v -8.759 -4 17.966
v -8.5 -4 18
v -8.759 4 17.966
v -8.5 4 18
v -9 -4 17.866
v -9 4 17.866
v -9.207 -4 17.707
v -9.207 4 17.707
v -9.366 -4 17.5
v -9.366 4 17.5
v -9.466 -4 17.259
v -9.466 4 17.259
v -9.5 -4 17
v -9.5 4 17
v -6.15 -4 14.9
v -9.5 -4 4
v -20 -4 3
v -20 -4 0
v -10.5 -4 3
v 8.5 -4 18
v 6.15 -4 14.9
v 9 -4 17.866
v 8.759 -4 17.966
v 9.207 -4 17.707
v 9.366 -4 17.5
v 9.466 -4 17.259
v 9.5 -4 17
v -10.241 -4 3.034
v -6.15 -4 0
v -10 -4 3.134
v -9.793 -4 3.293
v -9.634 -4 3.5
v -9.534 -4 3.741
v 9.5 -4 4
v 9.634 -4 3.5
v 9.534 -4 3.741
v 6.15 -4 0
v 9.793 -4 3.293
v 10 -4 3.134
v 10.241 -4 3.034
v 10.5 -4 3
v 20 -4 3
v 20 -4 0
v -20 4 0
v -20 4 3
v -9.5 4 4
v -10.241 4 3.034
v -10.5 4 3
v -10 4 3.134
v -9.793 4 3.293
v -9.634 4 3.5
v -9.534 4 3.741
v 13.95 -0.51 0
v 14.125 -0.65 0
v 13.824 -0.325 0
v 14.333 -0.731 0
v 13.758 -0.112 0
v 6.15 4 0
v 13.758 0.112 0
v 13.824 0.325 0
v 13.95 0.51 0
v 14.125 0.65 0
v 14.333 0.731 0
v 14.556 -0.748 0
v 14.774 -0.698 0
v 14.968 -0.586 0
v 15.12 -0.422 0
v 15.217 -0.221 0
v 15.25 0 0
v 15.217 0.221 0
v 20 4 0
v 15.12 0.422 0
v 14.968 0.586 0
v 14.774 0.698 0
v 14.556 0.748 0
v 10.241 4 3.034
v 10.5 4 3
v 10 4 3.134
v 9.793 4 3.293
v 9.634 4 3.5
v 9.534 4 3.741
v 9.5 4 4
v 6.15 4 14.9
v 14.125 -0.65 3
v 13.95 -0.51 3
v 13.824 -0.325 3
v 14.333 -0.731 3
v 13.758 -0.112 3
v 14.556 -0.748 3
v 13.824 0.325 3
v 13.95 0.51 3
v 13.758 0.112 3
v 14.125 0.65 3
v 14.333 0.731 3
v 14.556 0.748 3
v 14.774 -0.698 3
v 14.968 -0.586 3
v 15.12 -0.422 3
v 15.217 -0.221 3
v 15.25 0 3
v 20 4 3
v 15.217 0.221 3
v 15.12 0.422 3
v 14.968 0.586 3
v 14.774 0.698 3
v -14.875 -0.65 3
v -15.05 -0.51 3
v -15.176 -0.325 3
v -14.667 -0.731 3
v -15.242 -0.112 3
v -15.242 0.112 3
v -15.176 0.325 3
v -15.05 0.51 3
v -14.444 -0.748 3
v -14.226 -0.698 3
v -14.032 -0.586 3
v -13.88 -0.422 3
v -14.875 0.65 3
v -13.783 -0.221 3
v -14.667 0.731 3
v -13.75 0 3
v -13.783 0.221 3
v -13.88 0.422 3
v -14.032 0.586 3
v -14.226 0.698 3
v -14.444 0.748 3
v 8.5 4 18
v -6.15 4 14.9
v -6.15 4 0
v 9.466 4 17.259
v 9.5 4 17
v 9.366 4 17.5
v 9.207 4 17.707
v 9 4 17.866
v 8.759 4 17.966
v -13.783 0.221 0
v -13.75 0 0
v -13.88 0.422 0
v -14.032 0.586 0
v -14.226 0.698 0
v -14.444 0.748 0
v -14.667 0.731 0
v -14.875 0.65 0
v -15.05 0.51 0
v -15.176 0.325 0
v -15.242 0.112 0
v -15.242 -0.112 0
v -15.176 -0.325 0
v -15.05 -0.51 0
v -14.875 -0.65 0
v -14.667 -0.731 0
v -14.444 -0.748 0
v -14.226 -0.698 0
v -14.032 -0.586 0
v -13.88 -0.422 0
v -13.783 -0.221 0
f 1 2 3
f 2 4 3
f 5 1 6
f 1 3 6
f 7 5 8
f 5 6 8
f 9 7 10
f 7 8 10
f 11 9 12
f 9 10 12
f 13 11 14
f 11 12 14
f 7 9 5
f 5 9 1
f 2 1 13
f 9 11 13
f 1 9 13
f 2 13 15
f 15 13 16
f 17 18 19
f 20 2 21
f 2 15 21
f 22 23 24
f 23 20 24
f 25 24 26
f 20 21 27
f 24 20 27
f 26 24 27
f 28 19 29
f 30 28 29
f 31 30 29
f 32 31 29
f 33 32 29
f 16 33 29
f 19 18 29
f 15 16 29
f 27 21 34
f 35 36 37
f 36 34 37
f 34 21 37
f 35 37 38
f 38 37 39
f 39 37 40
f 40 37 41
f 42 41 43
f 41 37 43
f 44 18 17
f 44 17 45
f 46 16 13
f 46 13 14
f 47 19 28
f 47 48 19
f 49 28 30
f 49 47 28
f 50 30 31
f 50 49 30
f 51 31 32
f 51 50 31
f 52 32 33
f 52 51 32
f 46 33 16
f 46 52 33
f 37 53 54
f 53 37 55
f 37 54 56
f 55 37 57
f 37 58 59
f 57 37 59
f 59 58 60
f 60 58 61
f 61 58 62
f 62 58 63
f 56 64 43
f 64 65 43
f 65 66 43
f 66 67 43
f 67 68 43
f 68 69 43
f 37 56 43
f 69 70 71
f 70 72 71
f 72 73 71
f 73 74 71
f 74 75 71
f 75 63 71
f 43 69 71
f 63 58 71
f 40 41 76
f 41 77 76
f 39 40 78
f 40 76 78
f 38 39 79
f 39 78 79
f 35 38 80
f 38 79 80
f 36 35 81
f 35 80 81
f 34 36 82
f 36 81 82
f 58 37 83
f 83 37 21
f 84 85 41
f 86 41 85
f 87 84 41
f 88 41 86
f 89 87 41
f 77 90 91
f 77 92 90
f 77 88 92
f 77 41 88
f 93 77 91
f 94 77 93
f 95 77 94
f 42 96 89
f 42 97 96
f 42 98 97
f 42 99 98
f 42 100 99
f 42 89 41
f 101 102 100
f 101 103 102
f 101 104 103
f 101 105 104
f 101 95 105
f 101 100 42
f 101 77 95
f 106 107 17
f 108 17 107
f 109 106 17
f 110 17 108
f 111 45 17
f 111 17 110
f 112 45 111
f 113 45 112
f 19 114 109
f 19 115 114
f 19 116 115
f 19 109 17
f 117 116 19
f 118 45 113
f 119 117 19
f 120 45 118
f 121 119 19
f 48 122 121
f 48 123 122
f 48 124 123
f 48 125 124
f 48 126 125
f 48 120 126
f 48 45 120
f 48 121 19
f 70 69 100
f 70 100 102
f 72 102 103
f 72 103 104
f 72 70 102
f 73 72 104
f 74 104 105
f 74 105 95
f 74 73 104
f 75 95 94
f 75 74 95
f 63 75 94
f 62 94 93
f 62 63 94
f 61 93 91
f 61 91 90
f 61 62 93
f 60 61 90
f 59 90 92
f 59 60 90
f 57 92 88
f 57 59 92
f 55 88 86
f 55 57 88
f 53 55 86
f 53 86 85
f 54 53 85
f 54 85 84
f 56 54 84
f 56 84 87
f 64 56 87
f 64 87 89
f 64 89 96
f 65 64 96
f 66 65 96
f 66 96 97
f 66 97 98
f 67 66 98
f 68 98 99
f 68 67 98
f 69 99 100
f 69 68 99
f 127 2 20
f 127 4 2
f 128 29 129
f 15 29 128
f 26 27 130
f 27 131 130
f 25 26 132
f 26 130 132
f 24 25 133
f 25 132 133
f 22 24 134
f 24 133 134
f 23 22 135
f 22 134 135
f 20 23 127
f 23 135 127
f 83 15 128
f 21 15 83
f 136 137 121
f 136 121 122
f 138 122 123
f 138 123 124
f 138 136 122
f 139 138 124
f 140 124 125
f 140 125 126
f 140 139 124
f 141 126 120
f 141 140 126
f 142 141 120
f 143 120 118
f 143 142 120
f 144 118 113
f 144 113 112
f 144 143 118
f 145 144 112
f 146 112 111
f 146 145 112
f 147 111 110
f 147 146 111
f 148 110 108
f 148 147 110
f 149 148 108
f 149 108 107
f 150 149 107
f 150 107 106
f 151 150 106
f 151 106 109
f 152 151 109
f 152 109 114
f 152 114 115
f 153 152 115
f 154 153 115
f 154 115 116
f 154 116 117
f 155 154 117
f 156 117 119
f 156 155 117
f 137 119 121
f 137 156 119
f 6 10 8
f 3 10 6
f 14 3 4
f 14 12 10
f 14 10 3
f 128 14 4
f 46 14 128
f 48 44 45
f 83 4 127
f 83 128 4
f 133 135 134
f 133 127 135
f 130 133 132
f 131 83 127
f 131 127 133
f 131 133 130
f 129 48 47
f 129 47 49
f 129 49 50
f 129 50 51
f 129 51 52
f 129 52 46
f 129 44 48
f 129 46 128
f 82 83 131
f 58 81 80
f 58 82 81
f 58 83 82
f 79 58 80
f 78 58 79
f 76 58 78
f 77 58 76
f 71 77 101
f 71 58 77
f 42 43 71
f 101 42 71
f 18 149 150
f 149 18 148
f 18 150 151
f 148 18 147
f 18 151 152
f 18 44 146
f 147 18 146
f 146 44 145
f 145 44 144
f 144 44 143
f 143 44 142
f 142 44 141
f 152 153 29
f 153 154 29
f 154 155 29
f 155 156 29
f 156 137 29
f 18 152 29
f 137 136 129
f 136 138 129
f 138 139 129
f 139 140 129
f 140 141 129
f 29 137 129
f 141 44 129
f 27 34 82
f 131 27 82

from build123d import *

# Parameters (mm, degrees)
SKETCH1_W           = 40
SKETCH1_H           = 8
SKETCH1_R           = 0.75
BOSS_EXTRUDE1_DEPTH = 3
SKETCH2_W           = 19
SKETCH2_H           = 8
BOSS_EXTRUDE2_DEPTH = 15
SKETCH3_W           = 12.3
SKETCH3_H           = 29.8
CUT_EXTRUDE1_DEPTH  = 8
FILLET1_R           = 1


with BuildPart() as part:
    # Sketch1 → Boss-Extrude1 (new body)
    with BuildSketch(Plane.XY):
        Rectangle(SKETCH1_W, SKETCH1_H)
        with Locations((-14.5, 0)):
            Circle(SKETCH1_R, mode=Mode.SUBTRACT)
        with Locations((14.5, 0)):
            Circle(SKETCH1_R, mode=Mode.SUBTRACT)
    extrude(amount=BOSS_EXTRUDE1_DEPTH)

    # Sketch2 → Boss-Extrude2 (add)
    with BuildSketch(Plane.XY.offset(3)):
        Rectangle(SKETCH2_W, SKETCH2_H)
    extrude(amount=BOSS_EXTRUDE2_DEPTH)

    # Sketch3 → Cut-Extrude1 (cut)
    with BuildSketch(Plane.XZ.offset(4)):
        Rectangle(SKETCH3_W, SKETCH3_H)
    extrude(amount=-CUT_EXTRUDE1_DEPTH, mode=Mode.SUBTRACT)

    # Fillet1
    fillet1_edges = [part.edges().sort_by_distance(p)[0] for p in [
        (-9.5, 0, 3),
        (9.5, 0, 3),
        (-9.5, 0, 18),
        (9.5, 0, 18),
    ]]
    fillet(fillet1_edges, radius=FILLET1_R)


solid = part.part
